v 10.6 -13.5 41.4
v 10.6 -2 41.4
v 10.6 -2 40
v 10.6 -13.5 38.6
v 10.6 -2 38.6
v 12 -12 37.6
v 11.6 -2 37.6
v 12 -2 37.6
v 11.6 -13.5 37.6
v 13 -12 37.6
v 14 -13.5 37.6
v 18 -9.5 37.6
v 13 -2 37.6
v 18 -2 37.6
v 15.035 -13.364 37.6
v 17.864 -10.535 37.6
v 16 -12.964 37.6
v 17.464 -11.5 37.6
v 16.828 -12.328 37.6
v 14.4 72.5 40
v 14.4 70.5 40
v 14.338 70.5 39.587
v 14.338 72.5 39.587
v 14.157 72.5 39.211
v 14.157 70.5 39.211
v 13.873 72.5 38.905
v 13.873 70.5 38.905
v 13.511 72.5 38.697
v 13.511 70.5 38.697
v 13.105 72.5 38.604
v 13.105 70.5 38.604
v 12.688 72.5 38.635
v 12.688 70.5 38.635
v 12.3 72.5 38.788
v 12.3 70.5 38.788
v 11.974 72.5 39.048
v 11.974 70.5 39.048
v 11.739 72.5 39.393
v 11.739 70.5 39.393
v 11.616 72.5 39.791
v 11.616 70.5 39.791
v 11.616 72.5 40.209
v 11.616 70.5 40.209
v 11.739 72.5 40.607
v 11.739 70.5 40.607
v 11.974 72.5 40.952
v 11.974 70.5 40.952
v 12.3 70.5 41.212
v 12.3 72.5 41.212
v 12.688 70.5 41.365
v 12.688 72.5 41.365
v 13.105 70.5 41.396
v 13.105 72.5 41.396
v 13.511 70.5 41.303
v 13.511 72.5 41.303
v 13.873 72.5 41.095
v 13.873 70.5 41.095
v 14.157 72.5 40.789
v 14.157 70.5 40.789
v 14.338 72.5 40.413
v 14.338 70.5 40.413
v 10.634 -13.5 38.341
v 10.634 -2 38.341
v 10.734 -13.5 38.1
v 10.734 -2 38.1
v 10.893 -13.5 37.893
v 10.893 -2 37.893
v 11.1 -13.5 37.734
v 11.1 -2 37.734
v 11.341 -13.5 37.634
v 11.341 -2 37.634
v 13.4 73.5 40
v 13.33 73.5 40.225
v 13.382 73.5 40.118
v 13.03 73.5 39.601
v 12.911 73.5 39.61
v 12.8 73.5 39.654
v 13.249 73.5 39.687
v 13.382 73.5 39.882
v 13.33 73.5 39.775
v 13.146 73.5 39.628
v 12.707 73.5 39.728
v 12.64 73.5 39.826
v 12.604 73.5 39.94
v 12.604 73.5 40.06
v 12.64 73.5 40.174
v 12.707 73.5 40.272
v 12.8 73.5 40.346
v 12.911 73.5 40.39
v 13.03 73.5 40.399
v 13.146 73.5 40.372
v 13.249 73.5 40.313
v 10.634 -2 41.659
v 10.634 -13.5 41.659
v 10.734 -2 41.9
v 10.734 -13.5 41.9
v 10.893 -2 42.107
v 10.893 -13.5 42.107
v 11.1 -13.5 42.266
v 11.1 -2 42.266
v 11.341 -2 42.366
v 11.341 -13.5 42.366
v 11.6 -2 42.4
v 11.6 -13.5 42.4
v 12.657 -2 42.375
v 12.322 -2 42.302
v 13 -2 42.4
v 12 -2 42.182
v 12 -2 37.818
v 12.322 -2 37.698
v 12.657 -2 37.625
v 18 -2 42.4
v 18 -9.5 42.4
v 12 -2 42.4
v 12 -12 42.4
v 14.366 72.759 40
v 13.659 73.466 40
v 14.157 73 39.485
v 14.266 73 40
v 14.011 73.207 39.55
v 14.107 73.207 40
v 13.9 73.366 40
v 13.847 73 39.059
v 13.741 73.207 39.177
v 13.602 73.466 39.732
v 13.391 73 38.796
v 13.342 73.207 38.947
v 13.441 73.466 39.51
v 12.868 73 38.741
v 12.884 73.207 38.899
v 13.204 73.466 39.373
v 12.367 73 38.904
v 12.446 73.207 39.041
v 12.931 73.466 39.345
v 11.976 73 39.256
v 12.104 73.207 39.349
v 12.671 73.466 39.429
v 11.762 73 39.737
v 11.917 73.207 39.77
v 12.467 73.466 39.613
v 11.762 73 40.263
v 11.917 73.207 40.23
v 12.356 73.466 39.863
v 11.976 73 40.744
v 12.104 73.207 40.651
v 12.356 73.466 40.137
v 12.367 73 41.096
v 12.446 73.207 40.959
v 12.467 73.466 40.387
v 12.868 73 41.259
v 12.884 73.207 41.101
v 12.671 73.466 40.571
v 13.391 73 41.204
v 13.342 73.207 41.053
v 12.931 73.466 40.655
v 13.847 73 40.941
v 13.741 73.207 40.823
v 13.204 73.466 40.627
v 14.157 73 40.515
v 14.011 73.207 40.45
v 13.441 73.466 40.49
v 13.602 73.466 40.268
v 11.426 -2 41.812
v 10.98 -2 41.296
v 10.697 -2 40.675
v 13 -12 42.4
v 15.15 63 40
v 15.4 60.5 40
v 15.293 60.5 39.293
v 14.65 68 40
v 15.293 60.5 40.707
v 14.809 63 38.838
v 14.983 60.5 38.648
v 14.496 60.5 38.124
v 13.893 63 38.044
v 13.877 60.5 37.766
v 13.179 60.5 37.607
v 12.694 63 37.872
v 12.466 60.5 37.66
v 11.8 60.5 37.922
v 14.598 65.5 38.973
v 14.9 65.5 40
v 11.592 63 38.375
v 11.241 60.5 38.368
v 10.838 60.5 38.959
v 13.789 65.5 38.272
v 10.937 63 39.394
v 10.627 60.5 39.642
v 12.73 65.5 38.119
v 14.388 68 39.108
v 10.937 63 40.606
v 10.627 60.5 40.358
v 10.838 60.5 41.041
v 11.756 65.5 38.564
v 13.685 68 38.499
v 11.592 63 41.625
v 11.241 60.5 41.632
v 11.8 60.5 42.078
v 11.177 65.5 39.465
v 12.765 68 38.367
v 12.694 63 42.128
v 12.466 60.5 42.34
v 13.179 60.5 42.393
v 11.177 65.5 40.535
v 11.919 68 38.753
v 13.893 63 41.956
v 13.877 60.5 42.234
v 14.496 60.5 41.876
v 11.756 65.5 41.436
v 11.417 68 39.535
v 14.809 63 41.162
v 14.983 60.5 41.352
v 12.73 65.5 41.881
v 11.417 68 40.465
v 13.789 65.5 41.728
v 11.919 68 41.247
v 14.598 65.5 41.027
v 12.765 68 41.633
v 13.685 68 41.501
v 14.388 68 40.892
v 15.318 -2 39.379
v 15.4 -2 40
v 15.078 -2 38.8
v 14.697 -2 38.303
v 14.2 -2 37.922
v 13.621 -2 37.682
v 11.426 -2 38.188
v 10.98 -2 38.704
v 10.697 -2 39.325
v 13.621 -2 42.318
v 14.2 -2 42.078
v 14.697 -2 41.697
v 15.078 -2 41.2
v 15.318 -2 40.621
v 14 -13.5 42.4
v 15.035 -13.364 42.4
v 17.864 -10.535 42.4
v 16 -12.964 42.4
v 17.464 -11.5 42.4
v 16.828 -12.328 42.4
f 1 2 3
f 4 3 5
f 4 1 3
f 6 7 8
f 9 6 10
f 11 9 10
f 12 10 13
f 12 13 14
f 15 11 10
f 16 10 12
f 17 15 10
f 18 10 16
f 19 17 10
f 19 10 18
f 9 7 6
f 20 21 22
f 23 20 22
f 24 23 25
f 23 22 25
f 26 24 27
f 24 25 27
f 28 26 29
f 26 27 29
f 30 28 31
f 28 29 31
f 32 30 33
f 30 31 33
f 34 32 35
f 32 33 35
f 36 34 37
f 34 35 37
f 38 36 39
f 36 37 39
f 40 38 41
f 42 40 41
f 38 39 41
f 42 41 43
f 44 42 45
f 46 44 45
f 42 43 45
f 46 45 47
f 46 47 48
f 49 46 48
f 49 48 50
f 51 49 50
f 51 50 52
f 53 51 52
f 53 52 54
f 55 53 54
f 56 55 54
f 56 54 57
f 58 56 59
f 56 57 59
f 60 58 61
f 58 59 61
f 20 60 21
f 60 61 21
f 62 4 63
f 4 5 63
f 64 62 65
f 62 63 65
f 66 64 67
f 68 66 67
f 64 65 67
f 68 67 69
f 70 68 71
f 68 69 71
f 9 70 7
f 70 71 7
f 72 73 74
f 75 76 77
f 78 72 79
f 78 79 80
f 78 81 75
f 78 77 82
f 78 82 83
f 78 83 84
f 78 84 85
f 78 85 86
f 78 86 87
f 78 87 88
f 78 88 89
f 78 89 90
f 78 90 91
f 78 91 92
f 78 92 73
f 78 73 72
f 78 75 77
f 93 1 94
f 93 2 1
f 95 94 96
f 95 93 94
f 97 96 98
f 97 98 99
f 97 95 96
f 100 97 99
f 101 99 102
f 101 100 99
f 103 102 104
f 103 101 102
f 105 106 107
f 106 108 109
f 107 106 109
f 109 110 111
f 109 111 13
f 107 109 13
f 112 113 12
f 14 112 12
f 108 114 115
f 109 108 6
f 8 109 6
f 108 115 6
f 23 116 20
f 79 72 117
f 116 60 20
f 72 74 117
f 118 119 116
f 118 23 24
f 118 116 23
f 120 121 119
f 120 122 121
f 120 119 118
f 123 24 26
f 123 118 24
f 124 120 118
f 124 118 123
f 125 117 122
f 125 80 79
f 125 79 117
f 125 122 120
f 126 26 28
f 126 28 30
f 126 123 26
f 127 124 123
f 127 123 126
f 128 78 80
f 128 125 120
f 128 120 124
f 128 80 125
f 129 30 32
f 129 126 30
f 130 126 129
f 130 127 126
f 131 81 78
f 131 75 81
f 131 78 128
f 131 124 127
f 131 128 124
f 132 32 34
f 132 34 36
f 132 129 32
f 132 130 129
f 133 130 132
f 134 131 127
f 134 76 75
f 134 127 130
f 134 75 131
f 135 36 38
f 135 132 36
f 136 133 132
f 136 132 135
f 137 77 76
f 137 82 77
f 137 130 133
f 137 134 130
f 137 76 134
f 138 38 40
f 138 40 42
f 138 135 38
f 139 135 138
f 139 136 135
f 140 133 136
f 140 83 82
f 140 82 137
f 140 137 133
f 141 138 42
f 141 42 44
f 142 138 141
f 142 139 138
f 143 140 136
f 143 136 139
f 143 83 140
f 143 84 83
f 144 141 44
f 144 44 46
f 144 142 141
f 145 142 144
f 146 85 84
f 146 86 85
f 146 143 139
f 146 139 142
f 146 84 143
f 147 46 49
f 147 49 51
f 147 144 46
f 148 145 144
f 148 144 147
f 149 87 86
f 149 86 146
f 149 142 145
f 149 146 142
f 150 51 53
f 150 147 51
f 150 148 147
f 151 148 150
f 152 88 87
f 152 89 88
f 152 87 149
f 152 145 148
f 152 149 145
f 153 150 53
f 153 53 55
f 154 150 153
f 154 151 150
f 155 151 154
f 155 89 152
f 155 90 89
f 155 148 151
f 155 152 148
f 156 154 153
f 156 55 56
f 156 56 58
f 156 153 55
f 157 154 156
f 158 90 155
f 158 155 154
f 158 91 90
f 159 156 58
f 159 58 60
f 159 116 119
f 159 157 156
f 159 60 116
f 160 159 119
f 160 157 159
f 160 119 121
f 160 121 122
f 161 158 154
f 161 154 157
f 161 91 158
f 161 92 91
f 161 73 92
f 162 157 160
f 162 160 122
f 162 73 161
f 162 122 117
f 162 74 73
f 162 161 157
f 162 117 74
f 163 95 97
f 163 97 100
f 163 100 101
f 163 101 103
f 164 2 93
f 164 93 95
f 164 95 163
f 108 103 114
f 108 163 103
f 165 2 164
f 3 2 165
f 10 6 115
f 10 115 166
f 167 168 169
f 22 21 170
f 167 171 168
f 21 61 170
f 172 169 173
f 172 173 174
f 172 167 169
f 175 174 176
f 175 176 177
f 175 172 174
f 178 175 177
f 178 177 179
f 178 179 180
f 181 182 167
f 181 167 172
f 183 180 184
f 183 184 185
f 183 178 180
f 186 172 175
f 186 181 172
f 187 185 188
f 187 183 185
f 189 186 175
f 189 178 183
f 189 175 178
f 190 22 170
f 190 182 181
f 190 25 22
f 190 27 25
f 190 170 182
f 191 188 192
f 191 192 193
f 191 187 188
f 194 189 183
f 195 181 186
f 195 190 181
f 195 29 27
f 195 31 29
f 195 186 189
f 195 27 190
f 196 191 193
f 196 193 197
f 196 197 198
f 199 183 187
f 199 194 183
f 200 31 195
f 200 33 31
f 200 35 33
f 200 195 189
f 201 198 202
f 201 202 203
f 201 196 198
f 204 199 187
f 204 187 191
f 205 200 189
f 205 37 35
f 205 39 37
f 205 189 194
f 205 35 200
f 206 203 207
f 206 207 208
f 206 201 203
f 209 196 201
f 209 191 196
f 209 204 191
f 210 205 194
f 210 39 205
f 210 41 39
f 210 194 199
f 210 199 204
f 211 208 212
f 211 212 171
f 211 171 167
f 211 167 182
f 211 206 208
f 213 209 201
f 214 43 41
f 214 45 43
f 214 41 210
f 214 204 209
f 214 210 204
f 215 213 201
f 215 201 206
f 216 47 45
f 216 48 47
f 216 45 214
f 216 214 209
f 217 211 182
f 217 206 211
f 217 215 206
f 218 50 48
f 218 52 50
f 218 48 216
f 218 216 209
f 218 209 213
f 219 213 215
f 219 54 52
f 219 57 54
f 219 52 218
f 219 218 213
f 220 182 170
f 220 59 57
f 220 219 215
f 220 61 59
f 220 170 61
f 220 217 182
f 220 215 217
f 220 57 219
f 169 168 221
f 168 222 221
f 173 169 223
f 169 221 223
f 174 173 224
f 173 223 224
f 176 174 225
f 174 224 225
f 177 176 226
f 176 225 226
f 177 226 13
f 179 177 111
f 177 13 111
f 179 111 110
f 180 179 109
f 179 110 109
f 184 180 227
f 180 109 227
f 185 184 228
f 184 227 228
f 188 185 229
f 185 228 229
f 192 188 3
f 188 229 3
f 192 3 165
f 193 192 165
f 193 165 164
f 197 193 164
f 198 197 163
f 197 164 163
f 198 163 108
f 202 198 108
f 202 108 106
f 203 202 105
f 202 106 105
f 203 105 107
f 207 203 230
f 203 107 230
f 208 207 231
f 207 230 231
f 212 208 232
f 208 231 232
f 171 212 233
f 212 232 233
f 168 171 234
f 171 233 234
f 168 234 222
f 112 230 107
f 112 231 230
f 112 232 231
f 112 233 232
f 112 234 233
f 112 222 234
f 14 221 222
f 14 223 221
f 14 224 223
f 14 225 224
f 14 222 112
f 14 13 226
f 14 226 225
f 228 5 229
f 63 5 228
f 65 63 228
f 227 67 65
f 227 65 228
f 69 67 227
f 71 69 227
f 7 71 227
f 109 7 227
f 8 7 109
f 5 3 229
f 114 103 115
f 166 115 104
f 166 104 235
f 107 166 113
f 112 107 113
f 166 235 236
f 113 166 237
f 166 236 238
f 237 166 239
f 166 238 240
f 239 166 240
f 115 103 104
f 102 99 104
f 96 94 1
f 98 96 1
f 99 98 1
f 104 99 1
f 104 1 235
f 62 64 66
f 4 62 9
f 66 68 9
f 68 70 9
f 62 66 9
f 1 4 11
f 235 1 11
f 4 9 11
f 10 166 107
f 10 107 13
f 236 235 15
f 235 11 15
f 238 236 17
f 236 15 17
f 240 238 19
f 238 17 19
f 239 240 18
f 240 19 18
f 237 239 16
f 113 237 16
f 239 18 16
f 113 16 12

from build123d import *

# Parameters (mm, degrees)
CYLINDER026_R                                        = 1.4
CYLINDER026_DEPTH                                    = 3
FILLET005011017004_R                                 = 1
BOX085009_W                                          = 1
BOX085009_H                                          = 4.8
BOX085009_DEPTH                                      = 10
BOX085008_W                                          = 7.4
BOX085008_H                                          = 4.8
BOX085008_DEPTH                                      = 11.5
FILLET005011017005_R                                 = 1
FILLET005011017006_R                                 = 4
CYLINDER025_R                                        = 2.4
CYLINDER025_DEPTH                                    = 72.5
CHAMFER011002_SIZE2                                  = 1
CHAMFER011002_SIZE                                   = 10
FUSION004008002002002001007002002008_PLACEMENT_ANGLE = 90


with BuildPart() as fillet005011017004:
    # Cylinder026 → Cylinder026 (new body)
    with BuildSketch(Plane.XY.offset(72.5)):
        Circle(CYLINDER026_R)
    extrude(amount=CYLINDER026_DEPTH)

    # Fillet005011017004
    fillet005011017004_edges = [fillet005011017004.edges().sort_by_distance(p)[0] for p in [
        (-1.4, 0, 75.5),
    ]]
    fillet(fillet005011017004_edges, radius=FILLET005011017004_R)


with BuildPart() as cube097:
    # Box085009 → Box085009 (new body)
    with BuildSketch(Plane(origin=(-1, -2.4, -10), x_dir=(1, 0, 0), z_dir=(0, 0, 1))):
        with Locations((0.5, 2.4)):
            Rectangle(BOX085009_W, BOX085009_H)
    extrude(amount=BOX085009_DEPTH)


with BuildPart() as cut001002016002:
    # Box085008 → Box085008 (new body)
    with BuildSketch(Plane(origin=(-2.4, -2.4, -11.5), x_dir=(1, 0, 0), z_dir=(0, 0, 1))):
        with Locations((3.7, 2.4)):
            Rectangle(BOX085008_W, BOX085008_H)
    extrude(amount=BOX085008_DEPTH)

    # Fillet005011017005
    fillet005011017005_edges = [cut001002016002.edges().sort_by_distance(p)[0] for p in [
        (-2.4, -2.4, -5.75),
        (-2.4, 2.4, -5.75),
    ]]
    fillet(fillet005011017005_edges, radius=FILLET005011017005_R)

    # Fillet005011017006
    fillet005011017006_edges = [cut001002016002.edges().sort_by_distance(p)[0] for p in [
        (5, 0, -11.5),
    ]]
    fillet(fillet005011017006_edges, radius=FILLET005011017006_R)

    # Cut001002016002: cut Cube097
    add(cube097.part, mode=Mode.SUBTRACT)


with BuildPart() as stylus:
    # Cylinder025 → Cylinder025 (new body)
    with BuildSketch(Plane.XY):
        Circle(CYLINDER025_R)
    extrude(amount=CYLINDER025_DEPTH)

    # Chamfer011002
    chamfer011002_edges = [stylus.edges().sort_by_distance(p)[0] for p in [
        (-2.4, 0, 72.5),
    ]]
    chamfer011002_side = stylus.faces().sort_by_distance((-2.4, 0, 36.25))[0]
    chamfer(chamfer011002_edges, length=CHAMFER011002_SIZE, length2=CHAMFER011002_SIZE2, reference=chamfer011002_side)

    # Fusion004008002002002001007002002008: union Fillet005011017004, Cut001002016002
    add(fillet005011017004.part)
    add(cut001002016002.part)


with BuildPart() as stylus_1:
    # Fusion004008002002002001007002002008 placement: moved
    add(stylus.part.moved(Location((13, -2, 40))).rotate(Axis((13, -2, 40), (-1, 0, 0)), FUSION004008002002002001007002002008_PLACEMENT_ANGLE))


solid = stylus_1.part
